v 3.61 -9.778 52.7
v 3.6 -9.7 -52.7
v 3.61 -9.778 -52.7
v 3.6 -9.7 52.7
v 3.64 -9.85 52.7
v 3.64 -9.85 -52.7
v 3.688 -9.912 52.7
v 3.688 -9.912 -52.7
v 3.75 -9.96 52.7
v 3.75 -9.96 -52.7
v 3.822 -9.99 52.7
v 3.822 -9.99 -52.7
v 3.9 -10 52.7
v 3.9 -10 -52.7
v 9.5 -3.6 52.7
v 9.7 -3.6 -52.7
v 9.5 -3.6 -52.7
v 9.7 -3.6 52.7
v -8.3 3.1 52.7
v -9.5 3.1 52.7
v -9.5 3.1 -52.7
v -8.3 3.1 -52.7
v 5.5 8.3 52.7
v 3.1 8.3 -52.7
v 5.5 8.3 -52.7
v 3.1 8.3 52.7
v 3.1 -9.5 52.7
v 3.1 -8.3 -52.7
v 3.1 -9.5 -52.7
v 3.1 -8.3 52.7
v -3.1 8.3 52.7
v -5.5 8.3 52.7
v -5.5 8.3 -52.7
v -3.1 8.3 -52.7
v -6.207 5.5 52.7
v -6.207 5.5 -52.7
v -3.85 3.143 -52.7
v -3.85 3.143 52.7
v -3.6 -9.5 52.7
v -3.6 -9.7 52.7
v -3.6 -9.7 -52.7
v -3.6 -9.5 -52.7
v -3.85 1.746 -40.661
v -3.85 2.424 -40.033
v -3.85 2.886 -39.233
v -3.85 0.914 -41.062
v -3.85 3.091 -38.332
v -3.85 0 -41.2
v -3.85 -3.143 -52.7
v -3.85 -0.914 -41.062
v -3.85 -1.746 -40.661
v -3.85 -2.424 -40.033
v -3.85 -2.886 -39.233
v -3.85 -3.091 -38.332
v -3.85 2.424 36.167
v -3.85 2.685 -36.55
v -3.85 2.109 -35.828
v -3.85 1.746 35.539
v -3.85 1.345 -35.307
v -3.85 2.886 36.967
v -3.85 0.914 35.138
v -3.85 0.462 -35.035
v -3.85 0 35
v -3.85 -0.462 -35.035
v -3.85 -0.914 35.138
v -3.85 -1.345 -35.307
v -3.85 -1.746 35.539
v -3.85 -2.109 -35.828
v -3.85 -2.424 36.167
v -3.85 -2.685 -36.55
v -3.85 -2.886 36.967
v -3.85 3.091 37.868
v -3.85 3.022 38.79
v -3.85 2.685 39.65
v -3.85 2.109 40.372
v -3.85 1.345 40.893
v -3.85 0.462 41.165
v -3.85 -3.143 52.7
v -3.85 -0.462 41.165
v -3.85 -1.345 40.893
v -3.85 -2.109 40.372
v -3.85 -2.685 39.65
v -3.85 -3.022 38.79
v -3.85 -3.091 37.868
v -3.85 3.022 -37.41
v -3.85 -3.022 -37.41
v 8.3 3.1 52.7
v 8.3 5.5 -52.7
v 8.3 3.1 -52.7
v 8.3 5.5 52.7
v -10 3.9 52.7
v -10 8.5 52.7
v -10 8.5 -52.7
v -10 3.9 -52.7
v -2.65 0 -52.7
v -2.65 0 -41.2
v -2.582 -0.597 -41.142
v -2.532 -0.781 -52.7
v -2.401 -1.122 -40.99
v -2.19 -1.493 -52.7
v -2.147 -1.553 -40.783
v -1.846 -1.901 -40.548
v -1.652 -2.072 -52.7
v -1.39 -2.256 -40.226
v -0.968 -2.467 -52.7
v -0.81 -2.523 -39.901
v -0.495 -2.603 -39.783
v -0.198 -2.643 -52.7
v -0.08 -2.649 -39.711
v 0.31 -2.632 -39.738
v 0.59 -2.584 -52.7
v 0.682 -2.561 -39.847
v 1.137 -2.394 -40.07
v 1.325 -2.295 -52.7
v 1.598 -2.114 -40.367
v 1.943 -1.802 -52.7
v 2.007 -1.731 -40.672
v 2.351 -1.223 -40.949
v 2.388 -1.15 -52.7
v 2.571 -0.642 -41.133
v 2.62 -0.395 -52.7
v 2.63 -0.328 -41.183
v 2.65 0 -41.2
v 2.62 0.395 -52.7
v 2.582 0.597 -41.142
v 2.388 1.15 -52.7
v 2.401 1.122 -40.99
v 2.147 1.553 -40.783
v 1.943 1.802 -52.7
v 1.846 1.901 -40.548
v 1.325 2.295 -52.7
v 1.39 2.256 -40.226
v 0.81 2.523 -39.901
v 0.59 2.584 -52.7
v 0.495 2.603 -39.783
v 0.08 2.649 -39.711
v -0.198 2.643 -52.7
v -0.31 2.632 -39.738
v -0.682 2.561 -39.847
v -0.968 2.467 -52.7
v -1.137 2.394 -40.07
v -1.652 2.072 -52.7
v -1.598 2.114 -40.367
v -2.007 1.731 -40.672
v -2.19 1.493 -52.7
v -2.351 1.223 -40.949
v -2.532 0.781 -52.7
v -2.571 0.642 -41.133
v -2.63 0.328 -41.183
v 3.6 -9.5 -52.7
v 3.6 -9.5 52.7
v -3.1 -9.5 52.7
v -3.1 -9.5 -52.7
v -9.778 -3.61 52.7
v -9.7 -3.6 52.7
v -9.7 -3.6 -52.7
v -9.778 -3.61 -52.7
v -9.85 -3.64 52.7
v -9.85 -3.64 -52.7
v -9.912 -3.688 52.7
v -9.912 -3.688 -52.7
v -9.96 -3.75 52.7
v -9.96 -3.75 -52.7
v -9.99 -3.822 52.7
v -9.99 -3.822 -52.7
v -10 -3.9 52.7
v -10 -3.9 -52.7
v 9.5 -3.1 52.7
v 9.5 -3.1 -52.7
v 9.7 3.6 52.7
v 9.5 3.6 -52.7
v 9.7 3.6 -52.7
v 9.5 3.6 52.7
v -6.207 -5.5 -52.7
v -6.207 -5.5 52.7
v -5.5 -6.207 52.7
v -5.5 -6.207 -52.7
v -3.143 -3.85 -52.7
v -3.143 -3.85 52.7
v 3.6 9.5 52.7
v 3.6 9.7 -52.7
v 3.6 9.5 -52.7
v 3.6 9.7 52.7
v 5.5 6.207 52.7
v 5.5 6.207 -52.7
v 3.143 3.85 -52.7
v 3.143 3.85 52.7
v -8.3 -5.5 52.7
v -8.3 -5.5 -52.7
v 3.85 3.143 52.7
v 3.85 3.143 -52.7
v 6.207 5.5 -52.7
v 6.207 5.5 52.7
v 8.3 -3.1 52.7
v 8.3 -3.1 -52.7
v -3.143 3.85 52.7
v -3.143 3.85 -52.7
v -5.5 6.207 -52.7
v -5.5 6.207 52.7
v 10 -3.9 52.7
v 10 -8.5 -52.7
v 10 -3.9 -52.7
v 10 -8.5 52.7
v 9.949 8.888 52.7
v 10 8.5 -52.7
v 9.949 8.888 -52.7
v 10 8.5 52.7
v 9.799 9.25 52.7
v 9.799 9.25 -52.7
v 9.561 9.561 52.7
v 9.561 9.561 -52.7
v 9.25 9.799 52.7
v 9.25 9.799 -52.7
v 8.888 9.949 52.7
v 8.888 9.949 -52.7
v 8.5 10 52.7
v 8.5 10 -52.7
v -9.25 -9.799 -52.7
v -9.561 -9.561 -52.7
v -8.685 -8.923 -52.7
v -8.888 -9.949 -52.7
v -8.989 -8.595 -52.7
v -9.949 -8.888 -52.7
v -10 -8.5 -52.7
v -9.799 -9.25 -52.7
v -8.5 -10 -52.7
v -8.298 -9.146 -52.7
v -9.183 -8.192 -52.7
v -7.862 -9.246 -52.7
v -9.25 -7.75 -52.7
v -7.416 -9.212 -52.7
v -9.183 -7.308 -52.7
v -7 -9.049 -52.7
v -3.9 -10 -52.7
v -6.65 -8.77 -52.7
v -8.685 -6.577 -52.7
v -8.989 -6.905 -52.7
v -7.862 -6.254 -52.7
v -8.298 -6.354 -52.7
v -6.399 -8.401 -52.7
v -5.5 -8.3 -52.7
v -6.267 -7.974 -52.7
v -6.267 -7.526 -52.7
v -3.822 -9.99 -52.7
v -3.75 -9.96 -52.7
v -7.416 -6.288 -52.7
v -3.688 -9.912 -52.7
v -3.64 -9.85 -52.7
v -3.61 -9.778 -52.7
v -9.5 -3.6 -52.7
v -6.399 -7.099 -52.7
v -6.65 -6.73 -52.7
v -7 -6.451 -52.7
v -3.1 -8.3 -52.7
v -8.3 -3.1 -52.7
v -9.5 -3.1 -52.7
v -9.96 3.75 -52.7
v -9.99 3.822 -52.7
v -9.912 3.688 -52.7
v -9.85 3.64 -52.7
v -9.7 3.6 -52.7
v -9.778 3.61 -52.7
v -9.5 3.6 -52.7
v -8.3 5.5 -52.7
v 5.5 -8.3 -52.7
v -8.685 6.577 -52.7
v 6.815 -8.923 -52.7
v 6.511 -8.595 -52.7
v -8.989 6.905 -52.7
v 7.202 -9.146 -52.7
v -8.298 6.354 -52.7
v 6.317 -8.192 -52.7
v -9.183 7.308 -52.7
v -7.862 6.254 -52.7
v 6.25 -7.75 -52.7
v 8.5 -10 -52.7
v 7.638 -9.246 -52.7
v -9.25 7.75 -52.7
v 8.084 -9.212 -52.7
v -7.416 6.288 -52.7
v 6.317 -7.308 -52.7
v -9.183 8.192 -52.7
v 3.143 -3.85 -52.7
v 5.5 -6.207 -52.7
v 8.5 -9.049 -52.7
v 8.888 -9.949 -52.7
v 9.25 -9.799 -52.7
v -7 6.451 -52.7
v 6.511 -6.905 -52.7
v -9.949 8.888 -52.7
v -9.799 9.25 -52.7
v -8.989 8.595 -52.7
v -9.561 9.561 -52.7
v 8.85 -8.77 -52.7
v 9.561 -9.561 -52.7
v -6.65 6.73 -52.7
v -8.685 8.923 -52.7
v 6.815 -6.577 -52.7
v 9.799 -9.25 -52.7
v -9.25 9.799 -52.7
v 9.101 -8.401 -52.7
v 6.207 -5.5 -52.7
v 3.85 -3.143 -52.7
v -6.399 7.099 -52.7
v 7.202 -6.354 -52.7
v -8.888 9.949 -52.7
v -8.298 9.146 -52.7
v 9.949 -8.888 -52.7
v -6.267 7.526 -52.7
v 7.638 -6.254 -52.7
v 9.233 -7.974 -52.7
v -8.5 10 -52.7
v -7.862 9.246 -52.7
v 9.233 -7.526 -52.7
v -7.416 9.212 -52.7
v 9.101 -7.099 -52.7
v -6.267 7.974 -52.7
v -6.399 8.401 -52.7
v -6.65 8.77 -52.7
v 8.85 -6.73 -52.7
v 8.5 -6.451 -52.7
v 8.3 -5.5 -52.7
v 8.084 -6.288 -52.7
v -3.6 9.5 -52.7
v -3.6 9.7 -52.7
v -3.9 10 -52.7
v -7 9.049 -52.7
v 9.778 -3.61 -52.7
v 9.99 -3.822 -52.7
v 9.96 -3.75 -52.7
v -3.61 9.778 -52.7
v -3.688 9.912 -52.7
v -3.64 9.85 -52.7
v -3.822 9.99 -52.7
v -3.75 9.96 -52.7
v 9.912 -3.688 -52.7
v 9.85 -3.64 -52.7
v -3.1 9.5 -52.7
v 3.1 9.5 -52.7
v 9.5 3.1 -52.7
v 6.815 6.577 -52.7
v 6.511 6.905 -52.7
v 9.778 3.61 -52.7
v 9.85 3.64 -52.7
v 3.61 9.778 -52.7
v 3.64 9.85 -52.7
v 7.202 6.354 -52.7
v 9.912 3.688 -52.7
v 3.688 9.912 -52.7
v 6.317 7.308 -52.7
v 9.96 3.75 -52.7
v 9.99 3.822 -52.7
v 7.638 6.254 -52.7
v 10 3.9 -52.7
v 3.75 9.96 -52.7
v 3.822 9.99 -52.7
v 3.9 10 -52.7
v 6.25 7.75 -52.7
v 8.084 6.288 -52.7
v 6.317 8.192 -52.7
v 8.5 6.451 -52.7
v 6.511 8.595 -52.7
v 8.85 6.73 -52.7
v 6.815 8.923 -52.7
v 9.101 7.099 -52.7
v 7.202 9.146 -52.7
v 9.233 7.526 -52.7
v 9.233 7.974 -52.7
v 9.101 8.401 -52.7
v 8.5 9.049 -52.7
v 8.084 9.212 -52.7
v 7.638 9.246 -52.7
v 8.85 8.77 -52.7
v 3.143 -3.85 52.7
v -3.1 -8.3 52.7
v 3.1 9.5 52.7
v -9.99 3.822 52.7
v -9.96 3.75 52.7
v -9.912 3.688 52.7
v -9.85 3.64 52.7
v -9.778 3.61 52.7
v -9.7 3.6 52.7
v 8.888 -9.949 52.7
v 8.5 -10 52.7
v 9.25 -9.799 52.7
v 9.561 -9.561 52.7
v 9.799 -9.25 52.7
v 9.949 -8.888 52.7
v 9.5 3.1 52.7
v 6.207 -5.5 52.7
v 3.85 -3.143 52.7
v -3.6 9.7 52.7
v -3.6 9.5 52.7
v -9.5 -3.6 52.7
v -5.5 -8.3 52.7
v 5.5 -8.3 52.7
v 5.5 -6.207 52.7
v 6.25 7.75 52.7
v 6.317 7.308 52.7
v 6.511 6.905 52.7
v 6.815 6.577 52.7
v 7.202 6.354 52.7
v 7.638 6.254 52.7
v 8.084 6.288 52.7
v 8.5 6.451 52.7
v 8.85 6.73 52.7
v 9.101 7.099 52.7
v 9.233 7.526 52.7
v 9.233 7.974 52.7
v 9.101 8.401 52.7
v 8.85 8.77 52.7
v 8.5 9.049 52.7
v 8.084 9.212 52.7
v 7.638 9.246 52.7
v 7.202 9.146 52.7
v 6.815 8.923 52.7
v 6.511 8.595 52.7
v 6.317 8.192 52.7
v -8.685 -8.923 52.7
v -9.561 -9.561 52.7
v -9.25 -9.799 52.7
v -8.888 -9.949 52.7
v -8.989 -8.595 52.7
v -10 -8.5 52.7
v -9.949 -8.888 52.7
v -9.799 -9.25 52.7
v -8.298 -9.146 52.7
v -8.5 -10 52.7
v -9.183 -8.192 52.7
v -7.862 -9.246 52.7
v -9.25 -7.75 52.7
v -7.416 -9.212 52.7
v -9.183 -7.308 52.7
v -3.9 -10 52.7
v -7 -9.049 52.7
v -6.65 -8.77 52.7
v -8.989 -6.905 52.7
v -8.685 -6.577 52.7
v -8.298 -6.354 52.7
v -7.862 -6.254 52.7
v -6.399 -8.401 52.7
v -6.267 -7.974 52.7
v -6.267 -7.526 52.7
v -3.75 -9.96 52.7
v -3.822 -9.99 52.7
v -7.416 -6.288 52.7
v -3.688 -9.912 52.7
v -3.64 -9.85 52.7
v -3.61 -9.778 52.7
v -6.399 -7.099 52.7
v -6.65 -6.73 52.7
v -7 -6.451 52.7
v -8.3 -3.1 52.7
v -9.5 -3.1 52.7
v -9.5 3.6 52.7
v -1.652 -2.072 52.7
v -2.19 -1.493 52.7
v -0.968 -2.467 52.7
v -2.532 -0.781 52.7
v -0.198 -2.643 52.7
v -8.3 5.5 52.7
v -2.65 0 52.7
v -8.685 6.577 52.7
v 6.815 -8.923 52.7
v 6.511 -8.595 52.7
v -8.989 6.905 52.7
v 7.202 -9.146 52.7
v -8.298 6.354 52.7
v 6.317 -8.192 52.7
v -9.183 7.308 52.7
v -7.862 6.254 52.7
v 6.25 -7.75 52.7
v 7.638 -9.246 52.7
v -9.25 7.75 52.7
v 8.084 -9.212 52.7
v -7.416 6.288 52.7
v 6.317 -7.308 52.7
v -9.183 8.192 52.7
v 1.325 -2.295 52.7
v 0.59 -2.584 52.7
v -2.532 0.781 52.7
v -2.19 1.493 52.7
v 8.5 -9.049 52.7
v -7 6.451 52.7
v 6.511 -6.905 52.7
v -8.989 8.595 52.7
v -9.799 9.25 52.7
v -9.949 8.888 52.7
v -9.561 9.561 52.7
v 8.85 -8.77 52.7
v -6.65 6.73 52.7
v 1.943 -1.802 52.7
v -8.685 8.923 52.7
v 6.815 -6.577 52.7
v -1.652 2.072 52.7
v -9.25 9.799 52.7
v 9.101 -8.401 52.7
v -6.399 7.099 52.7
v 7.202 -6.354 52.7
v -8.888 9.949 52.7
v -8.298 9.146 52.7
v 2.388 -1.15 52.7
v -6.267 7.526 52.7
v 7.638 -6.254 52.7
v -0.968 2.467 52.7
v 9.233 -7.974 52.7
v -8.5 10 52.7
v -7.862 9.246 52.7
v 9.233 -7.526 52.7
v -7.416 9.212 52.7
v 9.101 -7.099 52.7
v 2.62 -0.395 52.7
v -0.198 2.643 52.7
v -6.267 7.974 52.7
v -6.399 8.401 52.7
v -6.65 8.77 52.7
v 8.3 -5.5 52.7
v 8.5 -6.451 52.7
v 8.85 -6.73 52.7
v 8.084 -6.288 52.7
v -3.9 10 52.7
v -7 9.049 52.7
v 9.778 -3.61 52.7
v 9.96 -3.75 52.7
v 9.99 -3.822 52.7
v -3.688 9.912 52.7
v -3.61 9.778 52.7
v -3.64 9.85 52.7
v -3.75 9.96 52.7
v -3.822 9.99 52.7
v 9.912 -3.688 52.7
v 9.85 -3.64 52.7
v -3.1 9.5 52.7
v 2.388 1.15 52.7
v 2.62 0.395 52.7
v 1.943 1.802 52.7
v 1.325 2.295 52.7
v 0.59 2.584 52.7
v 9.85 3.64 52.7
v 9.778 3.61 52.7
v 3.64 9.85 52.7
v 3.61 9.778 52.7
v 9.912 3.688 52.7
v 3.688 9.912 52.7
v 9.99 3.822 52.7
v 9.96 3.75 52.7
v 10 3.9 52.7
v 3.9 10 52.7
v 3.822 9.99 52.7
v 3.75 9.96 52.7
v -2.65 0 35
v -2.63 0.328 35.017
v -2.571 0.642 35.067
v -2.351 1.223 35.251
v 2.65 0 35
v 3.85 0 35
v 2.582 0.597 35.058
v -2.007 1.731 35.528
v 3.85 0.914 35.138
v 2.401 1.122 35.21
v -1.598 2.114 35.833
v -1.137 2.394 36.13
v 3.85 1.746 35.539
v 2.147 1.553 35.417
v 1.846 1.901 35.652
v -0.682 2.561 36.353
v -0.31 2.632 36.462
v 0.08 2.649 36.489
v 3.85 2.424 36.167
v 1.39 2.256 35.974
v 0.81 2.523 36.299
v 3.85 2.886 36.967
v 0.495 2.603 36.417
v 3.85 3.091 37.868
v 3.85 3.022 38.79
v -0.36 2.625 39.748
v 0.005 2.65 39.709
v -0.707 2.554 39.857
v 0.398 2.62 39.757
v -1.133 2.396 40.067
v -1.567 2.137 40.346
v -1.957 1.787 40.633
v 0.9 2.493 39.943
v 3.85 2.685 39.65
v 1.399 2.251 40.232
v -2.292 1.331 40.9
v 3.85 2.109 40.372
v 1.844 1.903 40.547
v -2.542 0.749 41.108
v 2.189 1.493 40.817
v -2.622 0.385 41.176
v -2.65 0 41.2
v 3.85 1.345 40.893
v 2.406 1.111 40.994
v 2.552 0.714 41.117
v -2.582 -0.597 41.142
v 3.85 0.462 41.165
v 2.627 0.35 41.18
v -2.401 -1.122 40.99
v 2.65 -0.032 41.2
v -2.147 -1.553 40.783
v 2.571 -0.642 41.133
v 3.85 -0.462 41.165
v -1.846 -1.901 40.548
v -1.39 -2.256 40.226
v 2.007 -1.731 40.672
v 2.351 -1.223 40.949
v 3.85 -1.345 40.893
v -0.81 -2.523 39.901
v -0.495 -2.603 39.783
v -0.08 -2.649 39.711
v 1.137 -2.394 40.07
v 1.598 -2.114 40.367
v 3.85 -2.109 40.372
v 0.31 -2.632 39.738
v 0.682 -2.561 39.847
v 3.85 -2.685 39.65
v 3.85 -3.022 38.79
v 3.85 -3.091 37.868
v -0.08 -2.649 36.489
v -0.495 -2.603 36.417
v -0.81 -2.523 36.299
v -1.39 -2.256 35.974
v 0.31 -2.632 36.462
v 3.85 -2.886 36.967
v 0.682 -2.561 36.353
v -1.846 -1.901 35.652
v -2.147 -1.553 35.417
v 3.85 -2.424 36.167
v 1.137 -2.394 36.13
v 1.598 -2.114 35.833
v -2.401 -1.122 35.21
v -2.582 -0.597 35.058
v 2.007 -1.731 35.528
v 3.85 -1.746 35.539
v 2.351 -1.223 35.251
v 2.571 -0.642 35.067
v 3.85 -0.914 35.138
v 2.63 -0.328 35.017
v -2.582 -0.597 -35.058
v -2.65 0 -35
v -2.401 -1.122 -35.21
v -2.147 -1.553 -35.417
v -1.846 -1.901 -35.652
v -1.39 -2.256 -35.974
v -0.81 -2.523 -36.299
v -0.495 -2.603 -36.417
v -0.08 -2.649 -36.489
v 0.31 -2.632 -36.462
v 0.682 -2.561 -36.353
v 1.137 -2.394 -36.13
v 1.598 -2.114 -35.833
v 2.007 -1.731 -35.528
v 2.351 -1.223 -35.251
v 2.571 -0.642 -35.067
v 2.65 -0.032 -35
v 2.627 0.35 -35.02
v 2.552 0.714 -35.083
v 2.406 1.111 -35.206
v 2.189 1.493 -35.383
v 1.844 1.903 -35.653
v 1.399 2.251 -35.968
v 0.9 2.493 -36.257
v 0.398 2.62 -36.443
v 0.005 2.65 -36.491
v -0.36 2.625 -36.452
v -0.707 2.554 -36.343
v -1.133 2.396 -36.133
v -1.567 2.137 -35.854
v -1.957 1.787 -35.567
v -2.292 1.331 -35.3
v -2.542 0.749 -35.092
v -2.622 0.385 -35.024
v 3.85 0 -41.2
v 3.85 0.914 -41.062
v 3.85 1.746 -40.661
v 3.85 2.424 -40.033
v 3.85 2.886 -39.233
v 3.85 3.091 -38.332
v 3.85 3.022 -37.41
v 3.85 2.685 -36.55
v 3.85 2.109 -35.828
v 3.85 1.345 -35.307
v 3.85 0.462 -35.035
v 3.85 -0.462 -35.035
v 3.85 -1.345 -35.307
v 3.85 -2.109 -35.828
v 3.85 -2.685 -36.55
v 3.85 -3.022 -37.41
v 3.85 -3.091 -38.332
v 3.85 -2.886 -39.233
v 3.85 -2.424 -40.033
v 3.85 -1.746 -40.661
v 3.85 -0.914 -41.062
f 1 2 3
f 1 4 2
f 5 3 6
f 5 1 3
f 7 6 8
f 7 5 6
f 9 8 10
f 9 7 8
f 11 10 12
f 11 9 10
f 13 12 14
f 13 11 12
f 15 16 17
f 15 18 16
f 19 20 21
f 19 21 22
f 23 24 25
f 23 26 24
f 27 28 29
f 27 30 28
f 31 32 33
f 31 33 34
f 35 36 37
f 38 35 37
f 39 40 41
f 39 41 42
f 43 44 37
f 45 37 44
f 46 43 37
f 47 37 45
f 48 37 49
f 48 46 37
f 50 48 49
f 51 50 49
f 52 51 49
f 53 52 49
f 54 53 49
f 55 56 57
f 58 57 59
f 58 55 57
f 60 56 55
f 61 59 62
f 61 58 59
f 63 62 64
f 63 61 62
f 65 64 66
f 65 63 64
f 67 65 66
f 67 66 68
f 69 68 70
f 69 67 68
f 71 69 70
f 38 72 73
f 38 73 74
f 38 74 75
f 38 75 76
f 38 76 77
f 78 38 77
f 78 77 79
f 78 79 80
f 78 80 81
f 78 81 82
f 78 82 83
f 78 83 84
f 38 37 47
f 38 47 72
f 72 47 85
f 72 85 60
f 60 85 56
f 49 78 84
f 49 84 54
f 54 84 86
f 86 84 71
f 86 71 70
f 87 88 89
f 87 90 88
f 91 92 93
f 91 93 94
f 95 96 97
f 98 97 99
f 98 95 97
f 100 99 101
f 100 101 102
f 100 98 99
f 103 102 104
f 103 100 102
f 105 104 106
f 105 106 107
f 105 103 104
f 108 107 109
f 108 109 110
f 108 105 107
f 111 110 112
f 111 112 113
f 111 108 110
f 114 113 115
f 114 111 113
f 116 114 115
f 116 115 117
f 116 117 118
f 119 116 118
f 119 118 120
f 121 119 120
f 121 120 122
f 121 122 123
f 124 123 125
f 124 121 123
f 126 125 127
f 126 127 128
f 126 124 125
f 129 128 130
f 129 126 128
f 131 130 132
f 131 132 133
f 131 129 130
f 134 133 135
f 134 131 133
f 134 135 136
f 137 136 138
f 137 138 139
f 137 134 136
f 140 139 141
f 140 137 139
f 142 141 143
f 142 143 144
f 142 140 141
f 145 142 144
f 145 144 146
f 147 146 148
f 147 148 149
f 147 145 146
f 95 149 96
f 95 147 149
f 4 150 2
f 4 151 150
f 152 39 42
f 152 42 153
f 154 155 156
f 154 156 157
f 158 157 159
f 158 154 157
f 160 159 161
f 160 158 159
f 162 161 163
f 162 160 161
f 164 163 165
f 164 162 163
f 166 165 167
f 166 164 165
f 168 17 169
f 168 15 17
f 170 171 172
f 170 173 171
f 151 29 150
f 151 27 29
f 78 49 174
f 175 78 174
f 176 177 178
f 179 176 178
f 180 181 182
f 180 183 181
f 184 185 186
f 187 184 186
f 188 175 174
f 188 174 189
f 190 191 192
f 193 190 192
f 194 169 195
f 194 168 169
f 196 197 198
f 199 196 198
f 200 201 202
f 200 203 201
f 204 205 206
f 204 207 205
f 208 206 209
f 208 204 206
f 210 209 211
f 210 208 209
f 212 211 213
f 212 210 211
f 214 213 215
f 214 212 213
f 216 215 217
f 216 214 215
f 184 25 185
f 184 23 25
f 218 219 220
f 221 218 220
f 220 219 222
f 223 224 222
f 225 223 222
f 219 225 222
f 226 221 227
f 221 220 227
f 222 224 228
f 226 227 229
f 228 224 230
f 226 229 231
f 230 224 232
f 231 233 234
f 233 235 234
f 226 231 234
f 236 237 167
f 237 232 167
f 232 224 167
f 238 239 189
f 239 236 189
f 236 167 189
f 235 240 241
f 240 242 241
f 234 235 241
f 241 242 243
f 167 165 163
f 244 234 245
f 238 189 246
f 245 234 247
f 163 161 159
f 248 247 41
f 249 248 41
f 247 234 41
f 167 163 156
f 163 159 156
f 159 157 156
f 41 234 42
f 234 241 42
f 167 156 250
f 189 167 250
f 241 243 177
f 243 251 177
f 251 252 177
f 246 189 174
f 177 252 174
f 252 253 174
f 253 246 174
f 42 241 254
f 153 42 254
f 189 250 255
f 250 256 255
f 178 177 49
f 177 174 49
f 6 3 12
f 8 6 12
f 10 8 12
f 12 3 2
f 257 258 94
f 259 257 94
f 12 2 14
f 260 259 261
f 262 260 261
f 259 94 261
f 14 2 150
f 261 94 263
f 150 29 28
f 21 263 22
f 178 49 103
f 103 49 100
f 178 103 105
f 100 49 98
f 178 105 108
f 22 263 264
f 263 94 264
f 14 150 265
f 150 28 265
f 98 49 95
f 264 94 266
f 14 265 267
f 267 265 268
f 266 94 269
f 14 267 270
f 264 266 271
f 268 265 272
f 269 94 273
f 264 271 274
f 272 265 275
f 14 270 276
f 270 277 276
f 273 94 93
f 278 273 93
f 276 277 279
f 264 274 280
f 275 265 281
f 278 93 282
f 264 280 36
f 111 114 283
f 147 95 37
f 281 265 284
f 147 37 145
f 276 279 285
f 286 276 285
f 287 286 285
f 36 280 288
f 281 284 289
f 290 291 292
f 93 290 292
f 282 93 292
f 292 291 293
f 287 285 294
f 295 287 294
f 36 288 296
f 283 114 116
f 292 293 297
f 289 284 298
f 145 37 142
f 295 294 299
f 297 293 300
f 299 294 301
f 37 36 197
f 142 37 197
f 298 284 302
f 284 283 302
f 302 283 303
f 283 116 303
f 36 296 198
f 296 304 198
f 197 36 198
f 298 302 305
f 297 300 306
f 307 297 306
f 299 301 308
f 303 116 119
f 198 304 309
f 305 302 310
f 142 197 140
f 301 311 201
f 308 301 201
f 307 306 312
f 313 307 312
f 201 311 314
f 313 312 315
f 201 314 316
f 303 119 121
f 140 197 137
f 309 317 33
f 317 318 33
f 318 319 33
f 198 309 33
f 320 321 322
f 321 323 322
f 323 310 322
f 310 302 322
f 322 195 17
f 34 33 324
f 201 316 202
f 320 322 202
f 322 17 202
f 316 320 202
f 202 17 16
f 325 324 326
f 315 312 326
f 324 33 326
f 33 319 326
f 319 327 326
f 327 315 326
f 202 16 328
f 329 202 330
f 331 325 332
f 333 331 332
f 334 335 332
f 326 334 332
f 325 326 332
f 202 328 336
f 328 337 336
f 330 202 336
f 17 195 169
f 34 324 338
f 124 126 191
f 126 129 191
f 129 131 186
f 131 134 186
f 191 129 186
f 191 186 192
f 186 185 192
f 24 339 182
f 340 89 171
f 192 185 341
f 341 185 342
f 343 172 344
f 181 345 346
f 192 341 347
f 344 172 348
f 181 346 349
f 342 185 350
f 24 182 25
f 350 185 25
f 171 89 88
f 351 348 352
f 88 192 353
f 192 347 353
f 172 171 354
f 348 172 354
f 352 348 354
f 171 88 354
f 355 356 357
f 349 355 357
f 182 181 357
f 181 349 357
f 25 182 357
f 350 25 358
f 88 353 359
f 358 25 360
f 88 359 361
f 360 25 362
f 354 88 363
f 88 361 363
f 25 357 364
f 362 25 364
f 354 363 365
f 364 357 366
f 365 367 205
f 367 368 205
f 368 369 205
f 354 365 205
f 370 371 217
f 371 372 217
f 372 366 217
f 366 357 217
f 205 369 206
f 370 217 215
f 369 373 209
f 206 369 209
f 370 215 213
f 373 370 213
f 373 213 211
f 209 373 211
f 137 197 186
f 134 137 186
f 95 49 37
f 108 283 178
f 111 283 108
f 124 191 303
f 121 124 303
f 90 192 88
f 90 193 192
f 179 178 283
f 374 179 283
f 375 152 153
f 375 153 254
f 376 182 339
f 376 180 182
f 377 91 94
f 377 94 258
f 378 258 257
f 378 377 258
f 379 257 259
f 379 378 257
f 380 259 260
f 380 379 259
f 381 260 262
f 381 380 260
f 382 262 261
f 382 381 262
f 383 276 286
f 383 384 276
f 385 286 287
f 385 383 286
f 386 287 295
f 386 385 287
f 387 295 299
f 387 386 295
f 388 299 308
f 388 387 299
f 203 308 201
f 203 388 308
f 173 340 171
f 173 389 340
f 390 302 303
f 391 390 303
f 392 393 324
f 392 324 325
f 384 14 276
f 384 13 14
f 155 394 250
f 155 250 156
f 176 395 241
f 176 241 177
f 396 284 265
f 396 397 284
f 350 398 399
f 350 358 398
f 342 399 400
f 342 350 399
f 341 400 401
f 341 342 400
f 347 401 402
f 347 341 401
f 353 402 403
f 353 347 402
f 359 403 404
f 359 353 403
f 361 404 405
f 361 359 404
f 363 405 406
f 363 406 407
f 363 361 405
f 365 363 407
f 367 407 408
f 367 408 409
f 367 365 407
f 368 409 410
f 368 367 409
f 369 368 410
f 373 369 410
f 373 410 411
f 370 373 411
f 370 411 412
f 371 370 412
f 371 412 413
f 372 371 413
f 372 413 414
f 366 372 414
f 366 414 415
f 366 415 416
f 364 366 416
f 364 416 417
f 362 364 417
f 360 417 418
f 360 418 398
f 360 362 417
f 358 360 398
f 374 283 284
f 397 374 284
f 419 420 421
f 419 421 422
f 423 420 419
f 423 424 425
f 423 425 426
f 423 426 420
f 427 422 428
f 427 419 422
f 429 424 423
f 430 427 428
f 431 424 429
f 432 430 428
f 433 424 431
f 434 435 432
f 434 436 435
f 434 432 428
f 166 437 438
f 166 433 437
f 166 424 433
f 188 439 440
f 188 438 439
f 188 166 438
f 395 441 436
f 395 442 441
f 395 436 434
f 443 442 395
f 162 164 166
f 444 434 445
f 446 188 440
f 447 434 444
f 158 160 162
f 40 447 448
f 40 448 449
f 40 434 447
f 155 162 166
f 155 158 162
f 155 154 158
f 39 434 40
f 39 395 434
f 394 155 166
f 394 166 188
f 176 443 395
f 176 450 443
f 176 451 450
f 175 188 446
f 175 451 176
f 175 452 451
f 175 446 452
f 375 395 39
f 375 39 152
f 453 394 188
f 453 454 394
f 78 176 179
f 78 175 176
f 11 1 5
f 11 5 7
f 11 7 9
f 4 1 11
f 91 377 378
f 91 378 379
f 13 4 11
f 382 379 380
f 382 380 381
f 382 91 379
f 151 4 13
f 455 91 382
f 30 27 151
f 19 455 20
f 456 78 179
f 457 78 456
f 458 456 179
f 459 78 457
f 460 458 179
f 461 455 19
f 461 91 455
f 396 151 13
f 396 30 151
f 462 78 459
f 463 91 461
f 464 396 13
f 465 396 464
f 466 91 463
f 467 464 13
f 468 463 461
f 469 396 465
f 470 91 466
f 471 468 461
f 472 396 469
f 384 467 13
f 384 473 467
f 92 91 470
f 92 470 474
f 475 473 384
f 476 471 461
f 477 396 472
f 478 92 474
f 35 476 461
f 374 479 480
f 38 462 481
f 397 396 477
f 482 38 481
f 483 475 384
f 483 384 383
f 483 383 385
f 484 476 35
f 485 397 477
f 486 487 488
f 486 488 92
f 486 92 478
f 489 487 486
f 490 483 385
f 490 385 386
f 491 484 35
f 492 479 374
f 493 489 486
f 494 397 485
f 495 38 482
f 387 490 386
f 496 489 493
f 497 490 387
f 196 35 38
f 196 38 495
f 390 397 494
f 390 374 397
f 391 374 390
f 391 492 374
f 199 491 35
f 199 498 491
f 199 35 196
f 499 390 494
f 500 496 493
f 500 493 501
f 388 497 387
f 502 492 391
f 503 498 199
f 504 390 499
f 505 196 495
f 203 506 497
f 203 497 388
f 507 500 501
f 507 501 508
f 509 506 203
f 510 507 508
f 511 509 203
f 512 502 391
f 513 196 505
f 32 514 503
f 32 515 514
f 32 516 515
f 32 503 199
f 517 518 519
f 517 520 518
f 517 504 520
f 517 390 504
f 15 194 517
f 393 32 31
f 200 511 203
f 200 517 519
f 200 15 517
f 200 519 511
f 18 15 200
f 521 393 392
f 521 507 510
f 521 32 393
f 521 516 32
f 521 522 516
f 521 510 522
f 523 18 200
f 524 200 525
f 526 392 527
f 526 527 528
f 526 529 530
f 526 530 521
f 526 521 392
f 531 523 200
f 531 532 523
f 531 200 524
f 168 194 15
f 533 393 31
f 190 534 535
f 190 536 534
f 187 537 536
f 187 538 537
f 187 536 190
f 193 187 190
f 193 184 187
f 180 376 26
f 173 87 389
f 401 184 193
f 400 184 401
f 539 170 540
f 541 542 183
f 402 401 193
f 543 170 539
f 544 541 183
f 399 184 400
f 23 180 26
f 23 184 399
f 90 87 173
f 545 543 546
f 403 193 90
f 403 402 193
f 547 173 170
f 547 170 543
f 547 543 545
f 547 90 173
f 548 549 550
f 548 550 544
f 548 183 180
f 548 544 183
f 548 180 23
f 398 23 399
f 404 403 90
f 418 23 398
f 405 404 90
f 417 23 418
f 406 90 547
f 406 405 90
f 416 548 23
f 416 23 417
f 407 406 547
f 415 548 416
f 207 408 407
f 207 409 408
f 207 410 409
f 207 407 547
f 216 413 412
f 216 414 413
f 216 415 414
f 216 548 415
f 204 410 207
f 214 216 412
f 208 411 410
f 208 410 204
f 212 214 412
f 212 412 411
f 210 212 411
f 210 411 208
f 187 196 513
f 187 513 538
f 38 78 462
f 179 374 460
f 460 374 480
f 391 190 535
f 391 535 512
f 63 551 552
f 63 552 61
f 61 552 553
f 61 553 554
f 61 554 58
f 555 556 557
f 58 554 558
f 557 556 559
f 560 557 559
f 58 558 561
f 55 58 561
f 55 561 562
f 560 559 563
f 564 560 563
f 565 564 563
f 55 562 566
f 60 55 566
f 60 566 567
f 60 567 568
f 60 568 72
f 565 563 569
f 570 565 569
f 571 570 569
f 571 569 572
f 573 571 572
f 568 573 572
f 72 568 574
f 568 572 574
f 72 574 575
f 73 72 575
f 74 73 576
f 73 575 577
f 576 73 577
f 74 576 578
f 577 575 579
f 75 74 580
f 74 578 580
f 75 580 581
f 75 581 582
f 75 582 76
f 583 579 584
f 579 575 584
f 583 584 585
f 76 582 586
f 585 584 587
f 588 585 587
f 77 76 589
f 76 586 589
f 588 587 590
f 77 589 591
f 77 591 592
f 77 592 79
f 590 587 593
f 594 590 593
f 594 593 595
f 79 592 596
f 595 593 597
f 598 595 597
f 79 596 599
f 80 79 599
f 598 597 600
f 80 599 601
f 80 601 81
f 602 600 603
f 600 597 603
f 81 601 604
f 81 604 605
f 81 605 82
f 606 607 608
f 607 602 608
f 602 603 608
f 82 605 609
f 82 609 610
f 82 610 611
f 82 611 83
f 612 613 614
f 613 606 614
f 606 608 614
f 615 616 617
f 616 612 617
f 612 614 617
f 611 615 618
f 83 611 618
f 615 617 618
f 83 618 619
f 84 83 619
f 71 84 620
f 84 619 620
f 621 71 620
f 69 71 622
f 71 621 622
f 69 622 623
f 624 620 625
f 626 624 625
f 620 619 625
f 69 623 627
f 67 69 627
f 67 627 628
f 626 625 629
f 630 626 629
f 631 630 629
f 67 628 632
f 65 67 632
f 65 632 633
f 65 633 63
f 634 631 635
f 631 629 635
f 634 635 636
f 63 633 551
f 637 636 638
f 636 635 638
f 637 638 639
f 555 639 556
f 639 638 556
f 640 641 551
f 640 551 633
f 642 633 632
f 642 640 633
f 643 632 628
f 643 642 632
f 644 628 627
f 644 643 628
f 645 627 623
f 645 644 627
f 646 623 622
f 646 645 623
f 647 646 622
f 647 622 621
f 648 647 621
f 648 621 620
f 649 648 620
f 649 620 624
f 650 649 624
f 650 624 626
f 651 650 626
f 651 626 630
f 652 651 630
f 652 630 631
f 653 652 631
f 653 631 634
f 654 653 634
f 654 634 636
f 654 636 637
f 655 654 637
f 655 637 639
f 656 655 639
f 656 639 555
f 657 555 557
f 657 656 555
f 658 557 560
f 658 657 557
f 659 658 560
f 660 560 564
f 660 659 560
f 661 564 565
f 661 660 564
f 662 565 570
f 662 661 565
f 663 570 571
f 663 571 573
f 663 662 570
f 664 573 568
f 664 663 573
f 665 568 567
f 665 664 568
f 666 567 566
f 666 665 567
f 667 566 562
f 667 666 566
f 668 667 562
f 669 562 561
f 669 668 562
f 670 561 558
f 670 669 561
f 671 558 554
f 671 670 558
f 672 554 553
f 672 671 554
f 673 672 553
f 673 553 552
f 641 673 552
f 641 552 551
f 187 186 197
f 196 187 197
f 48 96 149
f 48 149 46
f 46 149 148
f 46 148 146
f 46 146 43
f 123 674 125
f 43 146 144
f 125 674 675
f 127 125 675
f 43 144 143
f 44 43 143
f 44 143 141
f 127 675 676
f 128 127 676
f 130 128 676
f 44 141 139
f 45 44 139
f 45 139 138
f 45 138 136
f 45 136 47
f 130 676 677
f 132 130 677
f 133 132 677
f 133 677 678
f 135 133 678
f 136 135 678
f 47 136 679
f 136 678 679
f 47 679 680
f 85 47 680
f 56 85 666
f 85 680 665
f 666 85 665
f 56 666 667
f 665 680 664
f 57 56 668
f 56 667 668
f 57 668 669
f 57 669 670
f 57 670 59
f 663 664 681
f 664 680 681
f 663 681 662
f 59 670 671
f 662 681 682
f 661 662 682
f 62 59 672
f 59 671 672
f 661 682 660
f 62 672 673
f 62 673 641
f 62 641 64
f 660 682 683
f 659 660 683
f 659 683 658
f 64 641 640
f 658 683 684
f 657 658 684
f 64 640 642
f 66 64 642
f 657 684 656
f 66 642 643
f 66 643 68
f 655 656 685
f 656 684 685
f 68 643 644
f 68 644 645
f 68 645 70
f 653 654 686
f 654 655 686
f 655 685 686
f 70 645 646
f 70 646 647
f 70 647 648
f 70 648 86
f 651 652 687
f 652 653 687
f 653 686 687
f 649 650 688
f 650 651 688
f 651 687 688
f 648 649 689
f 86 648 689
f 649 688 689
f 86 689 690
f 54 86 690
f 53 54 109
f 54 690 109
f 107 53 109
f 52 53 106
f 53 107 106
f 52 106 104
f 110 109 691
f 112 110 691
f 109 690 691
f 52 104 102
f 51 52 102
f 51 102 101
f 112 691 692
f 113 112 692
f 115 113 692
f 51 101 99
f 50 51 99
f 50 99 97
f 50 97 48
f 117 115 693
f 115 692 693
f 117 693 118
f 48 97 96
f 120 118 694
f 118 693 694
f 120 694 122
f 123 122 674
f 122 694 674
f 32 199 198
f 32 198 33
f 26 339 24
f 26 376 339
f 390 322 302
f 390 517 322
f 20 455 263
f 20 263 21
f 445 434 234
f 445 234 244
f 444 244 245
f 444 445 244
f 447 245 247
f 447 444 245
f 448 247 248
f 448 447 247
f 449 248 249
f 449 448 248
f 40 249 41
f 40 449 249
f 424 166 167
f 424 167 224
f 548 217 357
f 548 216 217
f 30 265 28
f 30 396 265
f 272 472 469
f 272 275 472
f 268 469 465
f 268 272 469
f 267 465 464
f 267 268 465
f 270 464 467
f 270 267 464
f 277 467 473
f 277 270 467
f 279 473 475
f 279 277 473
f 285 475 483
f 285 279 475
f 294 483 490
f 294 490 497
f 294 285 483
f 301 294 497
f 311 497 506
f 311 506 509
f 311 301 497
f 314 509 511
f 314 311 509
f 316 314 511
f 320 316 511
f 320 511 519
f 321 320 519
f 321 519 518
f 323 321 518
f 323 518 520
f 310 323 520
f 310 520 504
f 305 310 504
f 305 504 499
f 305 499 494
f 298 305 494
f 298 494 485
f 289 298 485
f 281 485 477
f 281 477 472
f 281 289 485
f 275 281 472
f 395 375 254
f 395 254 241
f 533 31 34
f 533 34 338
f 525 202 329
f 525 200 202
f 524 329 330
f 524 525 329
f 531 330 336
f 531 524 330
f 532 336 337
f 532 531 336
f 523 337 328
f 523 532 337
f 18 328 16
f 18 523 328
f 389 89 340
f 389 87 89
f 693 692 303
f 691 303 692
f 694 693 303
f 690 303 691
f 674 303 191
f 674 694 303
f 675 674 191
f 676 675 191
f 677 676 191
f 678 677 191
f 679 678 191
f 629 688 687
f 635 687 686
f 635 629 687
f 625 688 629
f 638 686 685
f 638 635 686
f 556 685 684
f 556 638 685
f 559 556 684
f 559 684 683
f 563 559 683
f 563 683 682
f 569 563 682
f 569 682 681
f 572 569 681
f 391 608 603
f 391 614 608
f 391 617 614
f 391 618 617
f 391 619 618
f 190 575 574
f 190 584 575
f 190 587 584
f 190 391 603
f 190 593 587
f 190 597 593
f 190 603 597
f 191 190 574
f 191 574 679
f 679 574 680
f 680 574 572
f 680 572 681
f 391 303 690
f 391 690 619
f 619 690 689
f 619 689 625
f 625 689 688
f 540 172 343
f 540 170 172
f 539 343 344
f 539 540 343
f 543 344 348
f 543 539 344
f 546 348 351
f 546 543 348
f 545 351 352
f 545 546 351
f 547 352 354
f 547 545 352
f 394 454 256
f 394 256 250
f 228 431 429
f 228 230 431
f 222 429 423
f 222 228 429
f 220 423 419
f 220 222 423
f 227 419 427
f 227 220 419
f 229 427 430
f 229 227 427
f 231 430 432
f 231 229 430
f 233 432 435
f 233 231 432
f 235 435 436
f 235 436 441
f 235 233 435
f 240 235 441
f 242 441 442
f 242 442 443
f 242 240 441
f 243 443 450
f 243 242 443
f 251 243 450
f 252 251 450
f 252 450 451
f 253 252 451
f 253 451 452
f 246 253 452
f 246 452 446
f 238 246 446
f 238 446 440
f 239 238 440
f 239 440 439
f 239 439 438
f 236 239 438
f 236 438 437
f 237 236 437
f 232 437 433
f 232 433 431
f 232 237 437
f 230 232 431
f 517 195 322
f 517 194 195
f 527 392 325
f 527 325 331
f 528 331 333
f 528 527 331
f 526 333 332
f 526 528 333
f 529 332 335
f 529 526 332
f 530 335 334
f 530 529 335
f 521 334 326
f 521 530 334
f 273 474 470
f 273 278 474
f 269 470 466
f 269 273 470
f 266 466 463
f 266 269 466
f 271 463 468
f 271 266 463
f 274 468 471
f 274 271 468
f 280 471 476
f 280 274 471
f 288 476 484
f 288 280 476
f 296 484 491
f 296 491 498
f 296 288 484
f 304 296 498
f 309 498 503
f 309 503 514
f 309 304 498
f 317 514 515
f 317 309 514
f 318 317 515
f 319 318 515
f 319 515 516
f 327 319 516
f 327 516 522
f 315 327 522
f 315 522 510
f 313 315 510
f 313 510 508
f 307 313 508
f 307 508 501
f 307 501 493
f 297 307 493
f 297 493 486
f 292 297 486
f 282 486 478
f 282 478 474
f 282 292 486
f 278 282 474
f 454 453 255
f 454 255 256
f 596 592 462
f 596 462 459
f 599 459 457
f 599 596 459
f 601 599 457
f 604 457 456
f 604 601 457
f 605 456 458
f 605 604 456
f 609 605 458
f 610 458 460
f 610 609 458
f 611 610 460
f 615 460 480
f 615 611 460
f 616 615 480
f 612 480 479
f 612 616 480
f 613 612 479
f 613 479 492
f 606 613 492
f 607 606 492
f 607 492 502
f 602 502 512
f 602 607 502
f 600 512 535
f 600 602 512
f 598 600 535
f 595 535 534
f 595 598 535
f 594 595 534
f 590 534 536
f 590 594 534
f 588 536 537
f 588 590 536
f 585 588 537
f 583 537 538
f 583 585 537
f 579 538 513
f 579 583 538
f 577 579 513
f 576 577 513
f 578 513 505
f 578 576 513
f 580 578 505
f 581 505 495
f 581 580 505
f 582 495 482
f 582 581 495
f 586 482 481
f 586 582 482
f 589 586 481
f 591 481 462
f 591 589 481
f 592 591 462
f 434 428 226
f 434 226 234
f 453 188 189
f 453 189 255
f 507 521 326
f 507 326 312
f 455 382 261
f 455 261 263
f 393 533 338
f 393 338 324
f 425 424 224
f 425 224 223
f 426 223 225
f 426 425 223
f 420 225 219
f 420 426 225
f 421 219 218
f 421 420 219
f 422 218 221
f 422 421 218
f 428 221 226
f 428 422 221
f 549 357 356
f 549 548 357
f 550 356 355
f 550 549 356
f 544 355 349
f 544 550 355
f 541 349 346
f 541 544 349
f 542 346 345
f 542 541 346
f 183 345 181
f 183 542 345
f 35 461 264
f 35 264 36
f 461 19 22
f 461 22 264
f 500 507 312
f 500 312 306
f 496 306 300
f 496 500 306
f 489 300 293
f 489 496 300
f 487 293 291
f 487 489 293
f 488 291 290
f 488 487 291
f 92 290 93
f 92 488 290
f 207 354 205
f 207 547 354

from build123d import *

# Parameters (mm, degrees)
SKETCH_1_R          = 2.65
SKETCH_1_R_2        = 1.5
EXTRUDE_1_DEPTH     = 52.7
SKETCH_4_R          = 3.1
CUT_EXTRUDE_3_DEPTH = 56.399571298


with BuildPart() as part:
    # 草图1 → 凸台-拉伸1 (new, symmetric)
    with BuildSketch(Plane.XY):
        with BuildLine():
            Line((3.142893219, 3.85), (-3.142893219, 3.85))
            Line((-3.142893219, 3.85), (-5.5, 6.207106781))
            Line((-5.5, 6.207106781), (-5.5, 8.3))
            Line((-5.5, 8.3), (-3.1, 8.3))
            Line((-3.1, 8.3), (-3.1, 9.5))
            Line((-3.1, 9.5), (-3.6, 9.5))
            Line((-3.6, 9.5), (-3.6, 9.7))
            ThreePointArc((-3.6, 9.7), (-3.687867966, 9.912132034), (-3.9, 10))
            Line((-3.9, 10), (-8.5, 10))
            ThreePointArc((-8.5, 10), (-9.560660172, 9.560660172), (-10, 8.5))
            Line((-10, 8.5), (-10, 3.9))
            ThreePointArc((-10, 3.9), (-9.912132034, 3.687867966), (-9.7, 3.6))
            Line((-9.7, 3.6), (-9.5, 3.6))
            Line((-9.5, 3.6), (-9.5, 3.1))
            Line((-9.5, 3.1), (-8.3, 3.1))
            Line((-8.3, 3.1), (-8.3, 5.5))
            Line((-8.3, 5.5), (-6.207106781, 5.5))
            Line((-6.207106781, 5.5), (-3.85, 3.142893219))
            Line((-3.85, 3.142893219), (-3.85, -3.142893219))
            Line((-3.85, -3.142893219), (-6.207106781, -5.5))
            Line((-6.207106781, -5.5), (-8.3, -5.5))
            Line((-8.3, -5.5), (-8.3, -3.1))
            Line((-8.3, -3.1), (-9.5, -3.1))
            Line((-9.5, -3.1), (-9.5, -3.6))
            Line((-9.5, -3.6), (-9.7, -3.6))
            ThreePointArc((-9.7, -3.6), (-9.912132034, -3.687867966), (-10, -3.9))
            Line((-10, -3.9), (-10, -8.5))
            ThreePointArc((-10, -8.5), (-9.560660172, -9.560660172), (-8.5, -10))
            Line((-8.5, -10), (-3.9, -10))
            ThreePointArc((-3.9, -10), (-3.687867966, -9.912132034), (-3.6, -9.7))
            Line((-3.6, -9.7), (-3.6, -9.5))
            Line((-3.6, -9.5), (-3.1, -9.5))
            Line((-3.1, -9.5), (-3.1, -8.3))
            Line((-3.1, -8.3), (-5.5, -8.3))
            Line((-5.5, -8.3), (-5.5, -6.207106781))
            Line((-5.5, -6.207106781), (-3.142893219, -3.85))
            Line((-3.142893219, -3.85), (3.142893219, -3.85))
            Line((3.142893219, -3.85), (5.5, -6.207106781))
            Line((5.5, -6.207106781), (5.5, -8.3))
            Line((5.5, -8.3), (3.1, -8.3))
            Line((3.1, -8.3), (3.1, -9.5))
            Line((3.1, -9.5), (3.6, -9.5))
            Line((3.6, -9.5), (3.6, -9.7))
            ThreePointArc((3.6, -9.7), (3.687867966, -9.912132034), (3.9, -10))
            Line((3.9, -10), (8.5, -10))
            ThreePointArc((8.5, -10), (9.560660172, -9.560660172), (10, -8.5))
            Line((10, -8.5), (10, -3.9))
            ThreePointArc((10, -3.9), (9.912132034, -3.687867966), (9.7, -3.6))
            Line((9.7, -3.6), (9.5, -3.6))
            Line((9.5, -3.6), (9.5, -3.1))
            Line((9.5, -3.1), (8.3, -3.1))
            Line((8.3, -3.1), (8.3, -5.5))
            Line((8.3, -5.5), (6.207106781, -5.5))
            Line((6.207106781, -5.5), (3.85, -3.142893219))
            Line((3.85, -3.142893219), (3.85, 3.142893219))
            Line((3.85, 3.142893219), (6.207106781, 5.5))
            Line((6.207106781, 5.5), (8.3, 5.5))
            Line((8.3, 5.5), (8.3, 3.1))
            Line((8.3, 3.1), (9.5, 3.1))
            Line((9.5, 3.1), (9.5, 3.6))
            Line((9.5, 3.6), (9.7, 3.6))
            ThreePointArc((9.7, 3.6), (9.912132034, 3.687867966), (10, 3.9))
            Line((10, 3.9), (10, 8.5))
            ThreePointArc((10, 8.5), (9.560660172, 9.560660172), (8.5, 10))
            Line((8.5, 10), (3.9, 10))
            ThreePointArc((3.9, 10), (3.687867966, 9.912132034), (3.6, 9.7))
            Line((3.6, 9.7), (3.6, 9.5))
            Line((3.6, 9.5), (3.1, 9.5))
            Line((3.1, 9.5), (3.1, 8.3))
            Line((3.1, 8.3), (5.5, 8.3))
            Line((5.5, 8.3), (5.5, 6.207106781))
            Line((5.5, 6.207106781), (3.142893219, 3.85))
        make_face()
        with Locations(Location((0, 0, 0), (0, 0, 180))):
            Circle(SKETCH_1_R, mode=Mode.SUBTRACT)
        with Locations(Location((-7.75, 7.75, 0), (0, 0, 180))):
            Circle(SKETCH_1_R_2, mode=Mode.SUBTRACT)
        with Locations(Location((7.75, 7.75, 0), (0, 0, 180))):
            Circle(SKETCH_1_R_2, mode=Mode.SUBTRACT)
        with Locations(Location((7.75, -7.75, 0), (0, 0, 180))):
            Circle(SKETCH_1_R_2, mode=Mode.SUBTRACT)
        with Locations(Location((-7.75, -7.75, 0), (0, 0, 180))):
            Circle(SKETCH_1_R_2, mode=Mode.SUBTRACT)
    extrude(amount=EXTRUDE_1_DEPTH, both=True)

    # 草图4 → 切除-拉伸3 (cut, through all)
    with BuildSketch(Plane(origin=(3.85, 0, 0), x_dir=(0, 0, -1), z_dir=(1, 0, 0))):
        with Locations((-38.1, 0)):
            Circle(SKETCH_4_R)
        with Locations((38.1, 0)):
            Circle(SKETCH_4_R)
    extrude(amount=-CUT_EXTRUDE_3_DEPTH, mode=Mode.SUBTRACT)


solid = part.part
